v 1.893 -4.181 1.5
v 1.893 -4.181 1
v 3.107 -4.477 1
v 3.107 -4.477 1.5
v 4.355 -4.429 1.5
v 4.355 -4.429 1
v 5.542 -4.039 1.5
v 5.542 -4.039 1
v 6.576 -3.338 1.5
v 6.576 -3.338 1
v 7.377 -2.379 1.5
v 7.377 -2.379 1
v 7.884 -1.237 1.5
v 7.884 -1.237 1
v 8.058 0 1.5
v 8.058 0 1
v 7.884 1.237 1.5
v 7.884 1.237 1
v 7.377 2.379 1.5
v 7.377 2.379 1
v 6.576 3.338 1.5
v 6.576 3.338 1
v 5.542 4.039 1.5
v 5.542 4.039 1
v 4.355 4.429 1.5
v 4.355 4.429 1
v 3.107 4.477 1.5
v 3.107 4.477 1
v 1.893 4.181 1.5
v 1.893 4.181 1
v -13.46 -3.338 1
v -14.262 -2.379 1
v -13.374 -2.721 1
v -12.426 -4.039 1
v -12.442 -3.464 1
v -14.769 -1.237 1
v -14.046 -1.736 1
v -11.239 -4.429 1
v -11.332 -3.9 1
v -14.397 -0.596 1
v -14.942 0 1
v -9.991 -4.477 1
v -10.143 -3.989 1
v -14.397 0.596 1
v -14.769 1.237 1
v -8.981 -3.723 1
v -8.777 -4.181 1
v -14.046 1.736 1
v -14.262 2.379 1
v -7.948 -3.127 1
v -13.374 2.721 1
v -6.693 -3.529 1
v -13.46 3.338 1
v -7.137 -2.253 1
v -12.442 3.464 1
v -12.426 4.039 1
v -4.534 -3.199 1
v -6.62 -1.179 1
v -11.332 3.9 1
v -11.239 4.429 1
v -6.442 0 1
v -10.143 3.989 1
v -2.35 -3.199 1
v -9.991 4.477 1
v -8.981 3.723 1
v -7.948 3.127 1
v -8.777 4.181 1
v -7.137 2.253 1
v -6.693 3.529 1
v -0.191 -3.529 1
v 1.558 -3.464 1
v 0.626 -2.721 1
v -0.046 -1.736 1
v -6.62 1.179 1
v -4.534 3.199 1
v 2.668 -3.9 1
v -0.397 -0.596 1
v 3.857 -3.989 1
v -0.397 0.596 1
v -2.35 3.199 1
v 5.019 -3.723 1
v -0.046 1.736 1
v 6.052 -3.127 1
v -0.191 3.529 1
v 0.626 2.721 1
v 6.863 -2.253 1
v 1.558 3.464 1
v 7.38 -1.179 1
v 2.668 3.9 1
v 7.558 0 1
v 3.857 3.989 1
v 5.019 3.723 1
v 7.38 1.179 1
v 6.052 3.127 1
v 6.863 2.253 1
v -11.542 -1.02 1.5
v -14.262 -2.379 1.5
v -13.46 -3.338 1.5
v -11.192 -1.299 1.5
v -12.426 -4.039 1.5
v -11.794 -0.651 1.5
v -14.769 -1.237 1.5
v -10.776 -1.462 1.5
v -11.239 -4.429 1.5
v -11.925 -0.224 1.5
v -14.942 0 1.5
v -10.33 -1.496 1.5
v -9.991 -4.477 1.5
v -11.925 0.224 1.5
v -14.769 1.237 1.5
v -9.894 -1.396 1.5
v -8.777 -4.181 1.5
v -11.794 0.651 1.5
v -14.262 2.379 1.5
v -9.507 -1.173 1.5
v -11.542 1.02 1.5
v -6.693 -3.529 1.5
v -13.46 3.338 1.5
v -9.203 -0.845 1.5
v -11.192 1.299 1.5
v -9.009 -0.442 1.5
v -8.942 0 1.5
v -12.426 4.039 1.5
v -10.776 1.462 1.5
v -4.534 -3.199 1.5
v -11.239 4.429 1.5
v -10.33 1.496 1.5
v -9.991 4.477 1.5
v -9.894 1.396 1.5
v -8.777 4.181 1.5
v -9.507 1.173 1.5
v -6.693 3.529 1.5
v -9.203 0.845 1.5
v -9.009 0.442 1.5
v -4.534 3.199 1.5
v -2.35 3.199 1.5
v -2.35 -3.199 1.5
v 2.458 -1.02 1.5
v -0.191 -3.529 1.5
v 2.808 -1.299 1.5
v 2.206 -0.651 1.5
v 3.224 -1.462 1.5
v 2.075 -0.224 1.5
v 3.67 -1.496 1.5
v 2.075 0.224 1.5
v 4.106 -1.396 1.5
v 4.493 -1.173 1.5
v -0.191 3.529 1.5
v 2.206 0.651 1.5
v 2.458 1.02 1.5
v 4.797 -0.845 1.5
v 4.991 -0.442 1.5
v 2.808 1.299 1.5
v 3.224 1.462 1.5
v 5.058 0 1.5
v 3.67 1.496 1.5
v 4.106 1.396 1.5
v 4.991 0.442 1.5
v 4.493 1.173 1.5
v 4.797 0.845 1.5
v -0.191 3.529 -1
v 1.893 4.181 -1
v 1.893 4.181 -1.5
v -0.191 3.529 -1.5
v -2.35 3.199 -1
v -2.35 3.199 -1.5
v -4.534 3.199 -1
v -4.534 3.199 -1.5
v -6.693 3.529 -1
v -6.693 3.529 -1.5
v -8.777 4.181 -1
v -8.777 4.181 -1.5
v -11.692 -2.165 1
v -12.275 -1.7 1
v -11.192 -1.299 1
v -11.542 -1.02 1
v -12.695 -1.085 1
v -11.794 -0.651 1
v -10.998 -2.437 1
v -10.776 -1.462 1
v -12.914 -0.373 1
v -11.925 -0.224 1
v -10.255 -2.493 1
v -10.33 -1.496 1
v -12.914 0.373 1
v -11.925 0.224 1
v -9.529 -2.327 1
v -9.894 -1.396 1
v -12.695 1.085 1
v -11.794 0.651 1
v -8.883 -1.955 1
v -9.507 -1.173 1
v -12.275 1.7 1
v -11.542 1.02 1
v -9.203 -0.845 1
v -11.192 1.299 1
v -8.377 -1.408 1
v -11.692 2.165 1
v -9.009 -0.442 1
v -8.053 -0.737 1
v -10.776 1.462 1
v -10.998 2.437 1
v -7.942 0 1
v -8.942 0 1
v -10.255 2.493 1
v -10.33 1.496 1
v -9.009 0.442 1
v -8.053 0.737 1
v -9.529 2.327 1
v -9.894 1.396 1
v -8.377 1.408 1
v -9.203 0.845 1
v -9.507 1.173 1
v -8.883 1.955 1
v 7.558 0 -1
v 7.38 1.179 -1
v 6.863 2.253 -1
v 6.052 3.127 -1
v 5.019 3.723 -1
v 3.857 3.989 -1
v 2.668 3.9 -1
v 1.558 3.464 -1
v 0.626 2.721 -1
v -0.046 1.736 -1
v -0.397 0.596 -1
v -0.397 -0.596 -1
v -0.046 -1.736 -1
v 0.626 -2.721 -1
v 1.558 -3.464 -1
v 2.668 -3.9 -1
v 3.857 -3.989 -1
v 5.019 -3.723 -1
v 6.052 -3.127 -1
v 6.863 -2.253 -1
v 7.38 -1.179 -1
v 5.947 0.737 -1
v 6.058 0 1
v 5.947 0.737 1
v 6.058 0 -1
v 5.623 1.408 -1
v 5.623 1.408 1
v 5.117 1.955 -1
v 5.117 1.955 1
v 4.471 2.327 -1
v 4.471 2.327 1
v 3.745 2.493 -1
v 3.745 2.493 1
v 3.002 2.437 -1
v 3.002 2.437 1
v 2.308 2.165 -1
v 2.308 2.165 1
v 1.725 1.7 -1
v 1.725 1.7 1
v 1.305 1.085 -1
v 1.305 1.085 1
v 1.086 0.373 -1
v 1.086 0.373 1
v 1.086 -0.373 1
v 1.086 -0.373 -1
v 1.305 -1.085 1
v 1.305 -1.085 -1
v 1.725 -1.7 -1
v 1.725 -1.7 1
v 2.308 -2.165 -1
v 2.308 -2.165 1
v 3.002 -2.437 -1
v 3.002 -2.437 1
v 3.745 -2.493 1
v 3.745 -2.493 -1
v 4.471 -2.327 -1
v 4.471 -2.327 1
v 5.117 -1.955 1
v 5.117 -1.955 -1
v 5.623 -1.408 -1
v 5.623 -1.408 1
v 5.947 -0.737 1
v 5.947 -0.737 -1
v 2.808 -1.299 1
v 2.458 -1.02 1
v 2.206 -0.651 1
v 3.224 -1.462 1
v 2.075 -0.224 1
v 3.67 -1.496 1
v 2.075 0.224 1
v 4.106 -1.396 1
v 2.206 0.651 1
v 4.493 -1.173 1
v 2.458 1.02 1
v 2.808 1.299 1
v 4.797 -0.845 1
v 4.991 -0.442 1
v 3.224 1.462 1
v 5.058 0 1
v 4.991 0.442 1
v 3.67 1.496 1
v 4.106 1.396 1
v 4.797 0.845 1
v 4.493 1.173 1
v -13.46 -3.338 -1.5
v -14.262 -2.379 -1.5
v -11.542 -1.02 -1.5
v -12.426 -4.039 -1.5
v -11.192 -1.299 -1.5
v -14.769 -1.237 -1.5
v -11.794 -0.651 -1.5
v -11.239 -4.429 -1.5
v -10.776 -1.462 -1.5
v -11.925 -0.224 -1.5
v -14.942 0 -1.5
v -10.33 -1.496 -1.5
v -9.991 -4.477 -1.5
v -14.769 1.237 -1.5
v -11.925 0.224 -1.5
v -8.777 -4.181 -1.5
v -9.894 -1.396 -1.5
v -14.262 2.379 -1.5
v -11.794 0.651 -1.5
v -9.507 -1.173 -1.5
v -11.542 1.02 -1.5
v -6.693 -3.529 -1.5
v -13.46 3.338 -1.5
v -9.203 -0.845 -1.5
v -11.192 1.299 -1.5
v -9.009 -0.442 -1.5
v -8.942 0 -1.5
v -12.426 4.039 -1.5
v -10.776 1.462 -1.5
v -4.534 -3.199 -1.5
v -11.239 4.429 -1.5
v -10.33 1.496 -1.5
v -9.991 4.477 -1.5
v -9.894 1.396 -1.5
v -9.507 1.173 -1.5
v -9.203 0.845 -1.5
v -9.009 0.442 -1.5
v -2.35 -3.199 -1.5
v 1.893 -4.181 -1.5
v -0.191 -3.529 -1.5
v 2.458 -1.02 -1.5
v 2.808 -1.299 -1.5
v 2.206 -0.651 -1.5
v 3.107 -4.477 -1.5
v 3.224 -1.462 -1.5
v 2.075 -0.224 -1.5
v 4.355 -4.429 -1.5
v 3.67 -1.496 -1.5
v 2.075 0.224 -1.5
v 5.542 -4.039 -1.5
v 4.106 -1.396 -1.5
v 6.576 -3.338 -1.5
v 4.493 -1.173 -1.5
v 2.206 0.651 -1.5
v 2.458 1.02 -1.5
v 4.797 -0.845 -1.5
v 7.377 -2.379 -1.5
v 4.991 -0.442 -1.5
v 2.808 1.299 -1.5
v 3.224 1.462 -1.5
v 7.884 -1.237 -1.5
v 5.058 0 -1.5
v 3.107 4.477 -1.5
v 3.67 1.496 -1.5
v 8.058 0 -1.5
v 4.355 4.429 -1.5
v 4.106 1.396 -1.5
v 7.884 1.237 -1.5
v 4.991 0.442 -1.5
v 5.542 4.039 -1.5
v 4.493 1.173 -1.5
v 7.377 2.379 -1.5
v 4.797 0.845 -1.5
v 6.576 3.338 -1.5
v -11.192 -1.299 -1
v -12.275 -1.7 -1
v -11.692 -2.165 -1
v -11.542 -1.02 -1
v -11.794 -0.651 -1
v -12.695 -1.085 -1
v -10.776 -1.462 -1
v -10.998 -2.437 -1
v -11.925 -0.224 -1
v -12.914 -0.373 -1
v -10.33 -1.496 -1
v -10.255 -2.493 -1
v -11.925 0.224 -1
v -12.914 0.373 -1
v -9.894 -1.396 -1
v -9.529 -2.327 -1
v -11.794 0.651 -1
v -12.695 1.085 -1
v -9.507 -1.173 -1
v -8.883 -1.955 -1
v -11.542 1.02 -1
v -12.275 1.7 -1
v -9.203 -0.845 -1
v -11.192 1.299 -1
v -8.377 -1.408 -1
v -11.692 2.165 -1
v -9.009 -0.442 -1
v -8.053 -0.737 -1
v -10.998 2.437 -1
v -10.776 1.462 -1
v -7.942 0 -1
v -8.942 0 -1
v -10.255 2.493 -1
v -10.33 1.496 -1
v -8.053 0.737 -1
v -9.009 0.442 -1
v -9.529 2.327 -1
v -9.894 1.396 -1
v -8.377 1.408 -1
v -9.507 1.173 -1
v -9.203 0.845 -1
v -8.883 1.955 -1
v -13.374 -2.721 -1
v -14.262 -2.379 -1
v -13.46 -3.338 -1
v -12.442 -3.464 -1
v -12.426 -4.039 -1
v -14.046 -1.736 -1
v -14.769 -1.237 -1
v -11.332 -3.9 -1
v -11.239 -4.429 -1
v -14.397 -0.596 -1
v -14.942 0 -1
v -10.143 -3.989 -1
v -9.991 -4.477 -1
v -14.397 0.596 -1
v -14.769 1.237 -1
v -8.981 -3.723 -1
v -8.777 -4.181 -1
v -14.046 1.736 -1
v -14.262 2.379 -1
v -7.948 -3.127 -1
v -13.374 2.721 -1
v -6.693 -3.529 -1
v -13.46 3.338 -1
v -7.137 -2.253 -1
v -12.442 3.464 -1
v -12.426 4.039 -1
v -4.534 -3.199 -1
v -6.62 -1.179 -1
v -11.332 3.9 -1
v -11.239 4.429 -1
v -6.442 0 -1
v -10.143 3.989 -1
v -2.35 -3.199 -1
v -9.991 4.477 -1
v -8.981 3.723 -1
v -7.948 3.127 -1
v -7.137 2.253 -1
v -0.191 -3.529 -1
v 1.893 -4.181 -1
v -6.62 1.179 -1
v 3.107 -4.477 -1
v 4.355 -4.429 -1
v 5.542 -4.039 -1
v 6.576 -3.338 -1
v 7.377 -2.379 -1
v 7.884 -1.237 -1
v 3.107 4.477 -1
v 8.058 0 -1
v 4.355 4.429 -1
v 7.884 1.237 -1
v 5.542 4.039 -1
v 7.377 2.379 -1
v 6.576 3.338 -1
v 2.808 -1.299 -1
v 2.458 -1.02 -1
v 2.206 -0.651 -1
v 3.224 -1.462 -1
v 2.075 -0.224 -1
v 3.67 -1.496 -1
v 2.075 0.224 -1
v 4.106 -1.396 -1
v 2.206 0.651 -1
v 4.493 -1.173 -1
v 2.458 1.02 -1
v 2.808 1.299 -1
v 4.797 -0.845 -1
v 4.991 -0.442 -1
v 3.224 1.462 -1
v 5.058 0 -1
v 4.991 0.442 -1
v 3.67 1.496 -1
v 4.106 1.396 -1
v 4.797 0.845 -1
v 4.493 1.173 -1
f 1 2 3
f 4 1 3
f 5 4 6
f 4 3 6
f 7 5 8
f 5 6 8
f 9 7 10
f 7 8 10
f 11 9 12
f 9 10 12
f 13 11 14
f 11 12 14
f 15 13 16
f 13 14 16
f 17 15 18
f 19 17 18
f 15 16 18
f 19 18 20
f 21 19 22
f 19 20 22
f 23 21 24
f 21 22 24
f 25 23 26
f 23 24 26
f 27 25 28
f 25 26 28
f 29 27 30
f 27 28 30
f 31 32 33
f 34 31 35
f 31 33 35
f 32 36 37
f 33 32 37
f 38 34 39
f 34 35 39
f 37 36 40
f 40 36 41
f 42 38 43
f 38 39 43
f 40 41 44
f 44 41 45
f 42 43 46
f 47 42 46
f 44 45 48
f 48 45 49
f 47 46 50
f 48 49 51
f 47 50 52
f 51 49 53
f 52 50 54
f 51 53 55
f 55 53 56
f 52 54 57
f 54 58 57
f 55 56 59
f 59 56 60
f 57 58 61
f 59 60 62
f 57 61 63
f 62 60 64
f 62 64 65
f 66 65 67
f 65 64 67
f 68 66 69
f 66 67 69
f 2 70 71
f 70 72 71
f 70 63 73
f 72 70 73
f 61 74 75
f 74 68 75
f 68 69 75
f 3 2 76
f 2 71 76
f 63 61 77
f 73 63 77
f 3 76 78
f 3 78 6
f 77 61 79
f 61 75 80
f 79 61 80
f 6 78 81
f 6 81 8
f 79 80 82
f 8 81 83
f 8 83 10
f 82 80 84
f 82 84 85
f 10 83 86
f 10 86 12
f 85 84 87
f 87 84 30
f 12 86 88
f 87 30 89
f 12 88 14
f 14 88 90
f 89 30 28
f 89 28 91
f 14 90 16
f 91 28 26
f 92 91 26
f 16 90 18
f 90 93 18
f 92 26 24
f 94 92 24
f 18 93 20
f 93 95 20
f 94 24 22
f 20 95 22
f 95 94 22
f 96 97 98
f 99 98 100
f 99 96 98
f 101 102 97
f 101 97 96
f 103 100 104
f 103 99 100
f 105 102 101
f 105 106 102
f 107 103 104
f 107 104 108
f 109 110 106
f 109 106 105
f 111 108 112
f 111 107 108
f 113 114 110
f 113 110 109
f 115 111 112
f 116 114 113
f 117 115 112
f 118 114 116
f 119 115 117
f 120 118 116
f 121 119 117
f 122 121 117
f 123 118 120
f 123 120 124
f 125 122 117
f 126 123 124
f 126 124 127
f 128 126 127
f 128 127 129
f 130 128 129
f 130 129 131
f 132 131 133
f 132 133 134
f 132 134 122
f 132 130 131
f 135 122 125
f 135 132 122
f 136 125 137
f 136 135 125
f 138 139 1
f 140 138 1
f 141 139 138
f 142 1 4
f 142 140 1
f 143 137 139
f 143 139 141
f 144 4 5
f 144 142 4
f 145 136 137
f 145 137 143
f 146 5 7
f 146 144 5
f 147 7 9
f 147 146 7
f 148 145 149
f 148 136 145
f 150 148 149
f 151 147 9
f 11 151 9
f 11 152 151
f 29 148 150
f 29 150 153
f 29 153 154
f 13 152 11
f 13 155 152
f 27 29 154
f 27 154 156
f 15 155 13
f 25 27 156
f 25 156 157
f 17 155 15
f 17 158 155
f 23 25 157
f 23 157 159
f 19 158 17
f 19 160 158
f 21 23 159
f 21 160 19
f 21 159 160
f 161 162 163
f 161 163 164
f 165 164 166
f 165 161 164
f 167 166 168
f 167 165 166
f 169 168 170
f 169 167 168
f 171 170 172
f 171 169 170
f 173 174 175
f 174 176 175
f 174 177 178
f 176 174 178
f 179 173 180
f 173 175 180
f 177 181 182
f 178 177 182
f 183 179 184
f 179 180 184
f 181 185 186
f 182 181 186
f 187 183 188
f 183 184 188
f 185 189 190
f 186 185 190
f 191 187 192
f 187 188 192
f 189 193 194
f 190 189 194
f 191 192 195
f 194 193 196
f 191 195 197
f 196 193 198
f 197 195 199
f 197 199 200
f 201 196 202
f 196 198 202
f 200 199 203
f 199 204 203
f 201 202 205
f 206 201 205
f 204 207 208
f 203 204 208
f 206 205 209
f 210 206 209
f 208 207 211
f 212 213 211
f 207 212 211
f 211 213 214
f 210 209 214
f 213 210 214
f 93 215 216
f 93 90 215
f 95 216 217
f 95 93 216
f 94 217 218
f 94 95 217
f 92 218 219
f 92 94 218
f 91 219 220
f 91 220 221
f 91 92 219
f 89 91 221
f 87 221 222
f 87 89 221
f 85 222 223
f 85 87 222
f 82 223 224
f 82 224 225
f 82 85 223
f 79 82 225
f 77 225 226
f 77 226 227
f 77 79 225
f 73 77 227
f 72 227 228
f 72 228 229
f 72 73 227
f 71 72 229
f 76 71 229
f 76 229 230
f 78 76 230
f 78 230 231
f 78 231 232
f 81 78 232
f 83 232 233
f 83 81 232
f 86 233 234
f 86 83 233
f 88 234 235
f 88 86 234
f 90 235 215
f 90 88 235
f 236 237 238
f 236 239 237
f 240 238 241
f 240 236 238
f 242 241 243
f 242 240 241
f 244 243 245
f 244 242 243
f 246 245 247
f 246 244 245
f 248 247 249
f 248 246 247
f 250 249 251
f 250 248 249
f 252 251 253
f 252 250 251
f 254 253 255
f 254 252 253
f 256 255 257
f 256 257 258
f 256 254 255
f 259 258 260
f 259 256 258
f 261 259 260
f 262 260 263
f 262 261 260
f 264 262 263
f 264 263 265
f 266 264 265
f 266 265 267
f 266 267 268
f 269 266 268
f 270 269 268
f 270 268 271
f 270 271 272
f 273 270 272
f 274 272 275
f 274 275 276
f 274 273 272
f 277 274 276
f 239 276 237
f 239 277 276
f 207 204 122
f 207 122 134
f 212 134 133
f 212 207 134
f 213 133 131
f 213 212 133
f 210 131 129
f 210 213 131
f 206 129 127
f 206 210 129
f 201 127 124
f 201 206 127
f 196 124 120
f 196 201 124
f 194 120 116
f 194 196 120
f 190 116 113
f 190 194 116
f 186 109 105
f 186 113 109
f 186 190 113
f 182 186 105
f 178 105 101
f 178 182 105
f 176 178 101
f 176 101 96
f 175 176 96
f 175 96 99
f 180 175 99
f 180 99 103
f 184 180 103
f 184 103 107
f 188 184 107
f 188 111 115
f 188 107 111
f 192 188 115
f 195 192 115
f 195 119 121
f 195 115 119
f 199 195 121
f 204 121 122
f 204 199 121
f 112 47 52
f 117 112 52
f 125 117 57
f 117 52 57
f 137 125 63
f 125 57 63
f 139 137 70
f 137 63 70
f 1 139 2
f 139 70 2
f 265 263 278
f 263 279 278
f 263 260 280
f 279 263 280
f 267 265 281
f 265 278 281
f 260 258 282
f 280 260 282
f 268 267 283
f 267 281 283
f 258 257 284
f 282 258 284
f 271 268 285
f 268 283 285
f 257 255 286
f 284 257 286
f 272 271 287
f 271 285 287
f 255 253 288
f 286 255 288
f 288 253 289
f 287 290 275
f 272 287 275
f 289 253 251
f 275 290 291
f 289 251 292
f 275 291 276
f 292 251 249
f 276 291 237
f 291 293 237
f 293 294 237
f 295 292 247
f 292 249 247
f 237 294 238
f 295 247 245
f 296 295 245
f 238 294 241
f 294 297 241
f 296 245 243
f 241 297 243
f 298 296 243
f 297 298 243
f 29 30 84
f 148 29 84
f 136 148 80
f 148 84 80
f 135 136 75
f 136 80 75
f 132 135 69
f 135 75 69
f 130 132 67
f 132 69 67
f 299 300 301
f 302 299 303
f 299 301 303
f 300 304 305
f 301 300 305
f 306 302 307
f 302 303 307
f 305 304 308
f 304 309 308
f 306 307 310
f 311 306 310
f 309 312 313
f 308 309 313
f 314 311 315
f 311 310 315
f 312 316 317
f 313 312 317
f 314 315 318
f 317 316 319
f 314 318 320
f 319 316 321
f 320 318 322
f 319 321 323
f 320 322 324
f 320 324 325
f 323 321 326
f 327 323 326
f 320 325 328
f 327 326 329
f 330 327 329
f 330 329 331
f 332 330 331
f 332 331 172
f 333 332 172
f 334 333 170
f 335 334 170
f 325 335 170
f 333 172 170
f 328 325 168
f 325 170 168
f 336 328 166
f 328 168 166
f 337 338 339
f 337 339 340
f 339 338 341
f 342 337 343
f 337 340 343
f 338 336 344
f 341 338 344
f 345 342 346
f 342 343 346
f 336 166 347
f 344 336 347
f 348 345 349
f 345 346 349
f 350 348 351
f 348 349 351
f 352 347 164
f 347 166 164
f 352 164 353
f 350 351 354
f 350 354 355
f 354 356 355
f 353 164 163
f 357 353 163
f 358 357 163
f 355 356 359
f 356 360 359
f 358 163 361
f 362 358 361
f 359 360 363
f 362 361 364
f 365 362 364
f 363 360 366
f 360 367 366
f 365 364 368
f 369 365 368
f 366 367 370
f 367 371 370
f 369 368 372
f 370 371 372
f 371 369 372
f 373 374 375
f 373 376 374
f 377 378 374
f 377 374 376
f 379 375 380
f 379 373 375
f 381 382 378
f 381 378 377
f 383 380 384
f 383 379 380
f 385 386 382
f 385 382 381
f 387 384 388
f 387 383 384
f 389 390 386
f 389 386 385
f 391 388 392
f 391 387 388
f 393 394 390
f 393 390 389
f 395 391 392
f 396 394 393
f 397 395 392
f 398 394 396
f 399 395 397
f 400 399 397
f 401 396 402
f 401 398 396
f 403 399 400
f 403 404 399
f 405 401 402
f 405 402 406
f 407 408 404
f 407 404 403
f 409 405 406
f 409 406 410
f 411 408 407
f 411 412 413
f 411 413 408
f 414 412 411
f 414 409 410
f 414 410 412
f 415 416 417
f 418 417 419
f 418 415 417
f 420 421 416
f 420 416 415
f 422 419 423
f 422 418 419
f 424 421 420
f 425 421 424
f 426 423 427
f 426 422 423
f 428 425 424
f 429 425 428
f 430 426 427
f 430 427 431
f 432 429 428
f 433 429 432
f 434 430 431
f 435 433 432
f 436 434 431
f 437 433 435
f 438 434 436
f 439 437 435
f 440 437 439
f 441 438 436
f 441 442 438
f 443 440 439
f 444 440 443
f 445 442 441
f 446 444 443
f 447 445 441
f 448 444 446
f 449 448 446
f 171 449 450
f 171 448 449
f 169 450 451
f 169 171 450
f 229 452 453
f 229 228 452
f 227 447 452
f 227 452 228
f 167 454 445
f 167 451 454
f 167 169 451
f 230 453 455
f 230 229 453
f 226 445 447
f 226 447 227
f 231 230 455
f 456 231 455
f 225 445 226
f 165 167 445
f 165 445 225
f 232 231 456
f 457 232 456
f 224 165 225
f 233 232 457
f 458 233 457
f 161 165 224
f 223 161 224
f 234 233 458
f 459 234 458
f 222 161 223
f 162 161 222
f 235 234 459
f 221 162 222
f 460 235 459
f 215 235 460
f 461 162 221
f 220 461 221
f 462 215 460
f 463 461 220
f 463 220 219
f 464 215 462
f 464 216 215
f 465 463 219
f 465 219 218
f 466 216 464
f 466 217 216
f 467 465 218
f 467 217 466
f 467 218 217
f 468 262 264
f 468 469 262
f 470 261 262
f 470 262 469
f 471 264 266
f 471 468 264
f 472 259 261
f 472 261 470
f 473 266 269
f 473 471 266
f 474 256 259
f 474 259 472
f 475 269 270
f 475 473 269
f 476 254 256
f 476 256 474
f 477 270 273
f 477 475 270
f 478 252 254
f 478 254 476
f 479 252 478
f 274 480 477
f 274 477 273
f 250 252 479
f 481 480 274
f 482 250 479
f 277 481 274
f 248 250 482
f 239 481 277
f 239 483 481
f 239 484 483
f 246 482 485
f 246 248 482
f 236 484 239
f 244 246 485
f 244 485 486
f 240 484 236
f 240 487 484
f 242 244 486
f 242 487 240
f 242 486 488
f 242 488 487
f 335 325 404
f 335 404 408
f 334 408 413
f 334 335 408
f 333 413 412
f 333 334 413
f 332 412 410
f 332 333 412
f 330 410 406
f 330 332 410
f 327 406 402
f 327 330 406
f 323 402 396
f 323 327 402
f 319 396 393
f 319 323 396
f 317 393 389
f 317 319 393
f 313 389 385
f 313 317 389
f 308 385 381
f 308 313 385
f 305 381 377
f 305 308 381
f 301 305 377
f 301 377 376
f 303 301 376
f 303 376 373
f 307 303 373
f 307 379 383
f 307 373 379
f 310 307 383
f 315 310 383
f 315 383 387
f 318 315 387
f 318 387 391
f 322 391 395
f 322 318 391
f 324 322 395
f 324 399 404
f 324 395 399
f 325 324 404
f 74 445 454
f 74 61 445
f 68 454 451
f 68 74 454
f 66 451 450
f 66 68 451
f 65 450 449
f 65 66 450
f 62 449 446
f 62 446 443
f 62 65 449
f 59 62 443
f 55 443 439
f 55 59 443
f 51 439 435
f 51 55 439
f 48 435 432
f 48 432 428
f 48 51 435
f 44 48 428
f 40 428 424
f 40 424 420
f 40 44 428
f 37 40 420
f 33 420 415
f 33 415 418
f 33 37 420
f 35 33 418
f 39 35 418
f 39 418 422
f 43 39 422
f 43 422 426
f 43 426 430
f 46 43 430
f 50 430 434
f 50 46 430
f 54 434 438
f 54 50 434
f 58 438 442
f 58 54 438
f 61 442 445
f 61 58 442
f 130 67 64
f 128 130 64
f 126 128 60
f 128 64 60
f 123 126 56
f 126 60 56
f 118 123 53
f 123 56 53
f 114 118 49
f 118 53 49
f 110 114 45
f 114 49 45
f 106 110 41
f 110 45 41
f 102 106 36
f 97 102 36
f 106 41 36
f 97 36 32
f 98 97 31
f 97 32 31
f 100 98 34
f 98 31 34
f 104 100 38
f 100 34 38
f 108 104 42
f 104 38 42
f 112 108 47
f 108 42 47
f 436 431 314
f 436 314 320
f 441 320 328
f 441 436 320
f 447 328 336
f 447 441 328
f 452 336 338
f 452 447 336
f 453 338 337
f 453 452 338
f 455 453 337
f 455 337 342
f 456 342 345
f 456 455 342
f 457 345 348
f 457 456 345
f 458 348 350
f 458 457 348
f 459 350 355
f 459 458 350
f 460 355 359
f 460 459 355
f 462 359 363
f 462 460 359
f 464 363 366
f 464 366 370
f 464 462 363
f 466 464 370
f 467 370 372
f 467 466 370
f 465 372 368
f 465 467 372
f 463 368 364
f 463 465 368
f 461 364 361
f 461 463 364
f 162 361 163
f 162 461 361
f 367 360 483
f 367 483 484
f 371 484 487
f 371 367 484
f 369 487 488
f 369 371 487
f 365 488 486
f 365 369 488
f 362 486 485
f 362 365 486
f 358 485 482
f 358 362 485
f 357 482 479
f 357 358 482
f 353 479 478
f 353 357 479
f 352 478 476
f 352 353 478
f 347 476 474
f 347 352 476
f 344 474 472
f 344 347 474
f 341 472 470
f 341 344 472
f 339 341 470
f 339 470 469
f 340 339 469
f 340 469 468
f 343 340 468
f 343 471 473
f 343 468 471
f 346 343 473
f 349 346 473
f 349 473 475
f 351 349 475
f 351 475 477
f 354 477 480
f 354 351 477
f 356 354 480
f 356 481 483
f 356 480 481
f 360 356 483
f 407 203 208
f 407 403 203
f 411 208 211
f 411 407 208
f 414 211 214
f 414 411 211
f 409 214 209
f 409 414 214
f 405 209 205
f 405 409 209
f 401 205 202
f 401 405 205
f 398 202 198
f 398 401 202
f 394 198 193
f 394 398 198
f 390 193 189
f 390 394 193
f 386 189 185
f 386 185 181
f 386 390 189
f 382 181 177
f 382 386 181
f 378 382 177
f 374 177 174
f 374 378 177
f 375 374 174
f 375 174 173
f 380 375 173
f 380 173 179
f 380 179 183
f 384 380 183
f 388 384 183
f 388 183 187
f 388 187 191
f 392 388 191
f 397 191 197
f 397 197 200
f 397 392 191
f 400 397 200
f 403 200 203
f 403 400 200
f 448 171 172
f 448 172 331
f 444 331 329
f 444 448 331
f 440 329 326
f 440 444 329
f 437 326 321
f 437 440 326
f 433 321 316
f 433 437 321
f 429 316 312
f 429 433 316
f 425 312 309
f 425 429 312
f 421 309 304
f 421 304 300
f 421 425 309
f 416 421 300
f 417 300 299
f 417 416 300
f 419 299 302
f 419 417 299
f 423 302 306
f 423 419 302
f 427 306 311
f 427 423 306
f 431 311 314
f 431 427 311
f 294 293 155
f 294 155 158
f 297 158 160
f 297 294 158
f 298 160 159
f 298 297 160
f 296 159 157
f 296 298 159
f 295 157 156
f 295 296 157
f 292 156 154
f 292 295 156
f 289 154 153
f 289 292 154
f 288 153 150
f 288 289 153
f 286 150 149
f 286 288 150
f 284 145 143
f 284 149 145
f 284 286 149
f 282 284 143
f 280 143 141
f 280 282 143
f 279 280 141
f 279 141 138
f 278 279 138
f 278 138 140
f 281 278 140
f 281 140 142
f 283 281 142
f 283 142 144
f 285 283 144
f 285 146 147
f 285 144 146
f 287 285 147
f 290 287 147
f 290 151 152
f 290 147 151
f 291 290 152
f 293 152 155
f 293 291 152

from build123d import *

# Parameters (mm, degrees)
SKETCH1_R               = 4
SKETCH1_R_2             = 2.5
BOSS_EXTRUDE1_DEPTH     = 1
BOSS_EXTRUDE1_2_DEPTH   = 1
BOSS_EXTRUDE2_START     = 1
BOSS_EXTRUDE2_DEPTH     = 0.5
CUT_EXTRUDE1_DEPTH      = 16.67695104
CUT_EXTRUDE1_DEPTH_BACK = 16.67695104
SKETCH4_R               = 1.5


with BuildPart() as part:
    # Sketch1 → Boss-Extrude1 (new, symmetric)
    with BuildSketch(Plane.XY):
        with Locations((-10.442114773, 0)):
            Circle(SKETCH1_R)
        with Locations((-10.442114773, 0)):
            Circle(SKETCH1_R_2, mode=Mode.SUBTRACT)
    extrude(amount=BOSS_EXTRUDE1_DEPTH, both=True)



with BuildPart() as body_2:
    # Sketch1 → Boss-Extrude1 2 (new, symmetric)
    with BuildSketch(Plane.XY):
        with Locations((3.557885227, 0)):
            Circle(SKETCH1_R)
        with Locations((3.557885227, 0)):
            Circle(SKETCH1_R_2, mode=Mode.SUBTRACT)
    extrude(amount=BOSS_EXTRUDE1_2_DEPTH, both=True)


with BuildPart() as part_1:
    add(part.part)

    add(body_2.part)  # Boss-Extrude2 merges body 2
    # Sketch2 → Boss-Extrude2 (add)
    with BuildSketch(Plane.XY.offset(BOSS_EXTRUDE2_START)):
        with BuildLine():
            ThreePointArc((-8.7771853, 4.180670981), (-14.942114773, 0), (-8.7771853, -4.180670981))
            ThreePointArc((-8.7771853, -4.180670981), (-3.442114773, -3.157418725), (1.892955754, -4.180670981))
            ThreePointArc((1.892955754, -4.180670981), (8.057885227, 0), (1.892955754, 4.180670981))
            ThreePointArc((1.892955754, 4.180670981), (-3.442114773, 3.157418725), (-8.7771853, 4.180670981))
        make_face()
    boss_extrude2 = extrude(amount=BOSS_EXTRUDE2_DEPTH)

    # Mirror1: Boss-Extrude2 across plane
    add(boss_extrude2.mirror(Plane.XY))

    # Sketch4 → Cut-Extrude1 (cut, two sides: drawn at the far end of the back side and taken through both)
    with BuildSketch(Plane.XY.offset(-CUT_EXTRUDE1_DEPTH_BACK)):
        with Locations((-10.442114773, 0)):
            Circle(SKETCH4_R)
        with Locations((3.557885227, 0)):
            Circle(SKETCH4_R)
    extrude(amount=CUT_EXTRUDE1_DEPTH + CUT_EXTRUDE1_DEPTH_BACK, mode=Mode.SUBTRACT)


solid = part_1.part
